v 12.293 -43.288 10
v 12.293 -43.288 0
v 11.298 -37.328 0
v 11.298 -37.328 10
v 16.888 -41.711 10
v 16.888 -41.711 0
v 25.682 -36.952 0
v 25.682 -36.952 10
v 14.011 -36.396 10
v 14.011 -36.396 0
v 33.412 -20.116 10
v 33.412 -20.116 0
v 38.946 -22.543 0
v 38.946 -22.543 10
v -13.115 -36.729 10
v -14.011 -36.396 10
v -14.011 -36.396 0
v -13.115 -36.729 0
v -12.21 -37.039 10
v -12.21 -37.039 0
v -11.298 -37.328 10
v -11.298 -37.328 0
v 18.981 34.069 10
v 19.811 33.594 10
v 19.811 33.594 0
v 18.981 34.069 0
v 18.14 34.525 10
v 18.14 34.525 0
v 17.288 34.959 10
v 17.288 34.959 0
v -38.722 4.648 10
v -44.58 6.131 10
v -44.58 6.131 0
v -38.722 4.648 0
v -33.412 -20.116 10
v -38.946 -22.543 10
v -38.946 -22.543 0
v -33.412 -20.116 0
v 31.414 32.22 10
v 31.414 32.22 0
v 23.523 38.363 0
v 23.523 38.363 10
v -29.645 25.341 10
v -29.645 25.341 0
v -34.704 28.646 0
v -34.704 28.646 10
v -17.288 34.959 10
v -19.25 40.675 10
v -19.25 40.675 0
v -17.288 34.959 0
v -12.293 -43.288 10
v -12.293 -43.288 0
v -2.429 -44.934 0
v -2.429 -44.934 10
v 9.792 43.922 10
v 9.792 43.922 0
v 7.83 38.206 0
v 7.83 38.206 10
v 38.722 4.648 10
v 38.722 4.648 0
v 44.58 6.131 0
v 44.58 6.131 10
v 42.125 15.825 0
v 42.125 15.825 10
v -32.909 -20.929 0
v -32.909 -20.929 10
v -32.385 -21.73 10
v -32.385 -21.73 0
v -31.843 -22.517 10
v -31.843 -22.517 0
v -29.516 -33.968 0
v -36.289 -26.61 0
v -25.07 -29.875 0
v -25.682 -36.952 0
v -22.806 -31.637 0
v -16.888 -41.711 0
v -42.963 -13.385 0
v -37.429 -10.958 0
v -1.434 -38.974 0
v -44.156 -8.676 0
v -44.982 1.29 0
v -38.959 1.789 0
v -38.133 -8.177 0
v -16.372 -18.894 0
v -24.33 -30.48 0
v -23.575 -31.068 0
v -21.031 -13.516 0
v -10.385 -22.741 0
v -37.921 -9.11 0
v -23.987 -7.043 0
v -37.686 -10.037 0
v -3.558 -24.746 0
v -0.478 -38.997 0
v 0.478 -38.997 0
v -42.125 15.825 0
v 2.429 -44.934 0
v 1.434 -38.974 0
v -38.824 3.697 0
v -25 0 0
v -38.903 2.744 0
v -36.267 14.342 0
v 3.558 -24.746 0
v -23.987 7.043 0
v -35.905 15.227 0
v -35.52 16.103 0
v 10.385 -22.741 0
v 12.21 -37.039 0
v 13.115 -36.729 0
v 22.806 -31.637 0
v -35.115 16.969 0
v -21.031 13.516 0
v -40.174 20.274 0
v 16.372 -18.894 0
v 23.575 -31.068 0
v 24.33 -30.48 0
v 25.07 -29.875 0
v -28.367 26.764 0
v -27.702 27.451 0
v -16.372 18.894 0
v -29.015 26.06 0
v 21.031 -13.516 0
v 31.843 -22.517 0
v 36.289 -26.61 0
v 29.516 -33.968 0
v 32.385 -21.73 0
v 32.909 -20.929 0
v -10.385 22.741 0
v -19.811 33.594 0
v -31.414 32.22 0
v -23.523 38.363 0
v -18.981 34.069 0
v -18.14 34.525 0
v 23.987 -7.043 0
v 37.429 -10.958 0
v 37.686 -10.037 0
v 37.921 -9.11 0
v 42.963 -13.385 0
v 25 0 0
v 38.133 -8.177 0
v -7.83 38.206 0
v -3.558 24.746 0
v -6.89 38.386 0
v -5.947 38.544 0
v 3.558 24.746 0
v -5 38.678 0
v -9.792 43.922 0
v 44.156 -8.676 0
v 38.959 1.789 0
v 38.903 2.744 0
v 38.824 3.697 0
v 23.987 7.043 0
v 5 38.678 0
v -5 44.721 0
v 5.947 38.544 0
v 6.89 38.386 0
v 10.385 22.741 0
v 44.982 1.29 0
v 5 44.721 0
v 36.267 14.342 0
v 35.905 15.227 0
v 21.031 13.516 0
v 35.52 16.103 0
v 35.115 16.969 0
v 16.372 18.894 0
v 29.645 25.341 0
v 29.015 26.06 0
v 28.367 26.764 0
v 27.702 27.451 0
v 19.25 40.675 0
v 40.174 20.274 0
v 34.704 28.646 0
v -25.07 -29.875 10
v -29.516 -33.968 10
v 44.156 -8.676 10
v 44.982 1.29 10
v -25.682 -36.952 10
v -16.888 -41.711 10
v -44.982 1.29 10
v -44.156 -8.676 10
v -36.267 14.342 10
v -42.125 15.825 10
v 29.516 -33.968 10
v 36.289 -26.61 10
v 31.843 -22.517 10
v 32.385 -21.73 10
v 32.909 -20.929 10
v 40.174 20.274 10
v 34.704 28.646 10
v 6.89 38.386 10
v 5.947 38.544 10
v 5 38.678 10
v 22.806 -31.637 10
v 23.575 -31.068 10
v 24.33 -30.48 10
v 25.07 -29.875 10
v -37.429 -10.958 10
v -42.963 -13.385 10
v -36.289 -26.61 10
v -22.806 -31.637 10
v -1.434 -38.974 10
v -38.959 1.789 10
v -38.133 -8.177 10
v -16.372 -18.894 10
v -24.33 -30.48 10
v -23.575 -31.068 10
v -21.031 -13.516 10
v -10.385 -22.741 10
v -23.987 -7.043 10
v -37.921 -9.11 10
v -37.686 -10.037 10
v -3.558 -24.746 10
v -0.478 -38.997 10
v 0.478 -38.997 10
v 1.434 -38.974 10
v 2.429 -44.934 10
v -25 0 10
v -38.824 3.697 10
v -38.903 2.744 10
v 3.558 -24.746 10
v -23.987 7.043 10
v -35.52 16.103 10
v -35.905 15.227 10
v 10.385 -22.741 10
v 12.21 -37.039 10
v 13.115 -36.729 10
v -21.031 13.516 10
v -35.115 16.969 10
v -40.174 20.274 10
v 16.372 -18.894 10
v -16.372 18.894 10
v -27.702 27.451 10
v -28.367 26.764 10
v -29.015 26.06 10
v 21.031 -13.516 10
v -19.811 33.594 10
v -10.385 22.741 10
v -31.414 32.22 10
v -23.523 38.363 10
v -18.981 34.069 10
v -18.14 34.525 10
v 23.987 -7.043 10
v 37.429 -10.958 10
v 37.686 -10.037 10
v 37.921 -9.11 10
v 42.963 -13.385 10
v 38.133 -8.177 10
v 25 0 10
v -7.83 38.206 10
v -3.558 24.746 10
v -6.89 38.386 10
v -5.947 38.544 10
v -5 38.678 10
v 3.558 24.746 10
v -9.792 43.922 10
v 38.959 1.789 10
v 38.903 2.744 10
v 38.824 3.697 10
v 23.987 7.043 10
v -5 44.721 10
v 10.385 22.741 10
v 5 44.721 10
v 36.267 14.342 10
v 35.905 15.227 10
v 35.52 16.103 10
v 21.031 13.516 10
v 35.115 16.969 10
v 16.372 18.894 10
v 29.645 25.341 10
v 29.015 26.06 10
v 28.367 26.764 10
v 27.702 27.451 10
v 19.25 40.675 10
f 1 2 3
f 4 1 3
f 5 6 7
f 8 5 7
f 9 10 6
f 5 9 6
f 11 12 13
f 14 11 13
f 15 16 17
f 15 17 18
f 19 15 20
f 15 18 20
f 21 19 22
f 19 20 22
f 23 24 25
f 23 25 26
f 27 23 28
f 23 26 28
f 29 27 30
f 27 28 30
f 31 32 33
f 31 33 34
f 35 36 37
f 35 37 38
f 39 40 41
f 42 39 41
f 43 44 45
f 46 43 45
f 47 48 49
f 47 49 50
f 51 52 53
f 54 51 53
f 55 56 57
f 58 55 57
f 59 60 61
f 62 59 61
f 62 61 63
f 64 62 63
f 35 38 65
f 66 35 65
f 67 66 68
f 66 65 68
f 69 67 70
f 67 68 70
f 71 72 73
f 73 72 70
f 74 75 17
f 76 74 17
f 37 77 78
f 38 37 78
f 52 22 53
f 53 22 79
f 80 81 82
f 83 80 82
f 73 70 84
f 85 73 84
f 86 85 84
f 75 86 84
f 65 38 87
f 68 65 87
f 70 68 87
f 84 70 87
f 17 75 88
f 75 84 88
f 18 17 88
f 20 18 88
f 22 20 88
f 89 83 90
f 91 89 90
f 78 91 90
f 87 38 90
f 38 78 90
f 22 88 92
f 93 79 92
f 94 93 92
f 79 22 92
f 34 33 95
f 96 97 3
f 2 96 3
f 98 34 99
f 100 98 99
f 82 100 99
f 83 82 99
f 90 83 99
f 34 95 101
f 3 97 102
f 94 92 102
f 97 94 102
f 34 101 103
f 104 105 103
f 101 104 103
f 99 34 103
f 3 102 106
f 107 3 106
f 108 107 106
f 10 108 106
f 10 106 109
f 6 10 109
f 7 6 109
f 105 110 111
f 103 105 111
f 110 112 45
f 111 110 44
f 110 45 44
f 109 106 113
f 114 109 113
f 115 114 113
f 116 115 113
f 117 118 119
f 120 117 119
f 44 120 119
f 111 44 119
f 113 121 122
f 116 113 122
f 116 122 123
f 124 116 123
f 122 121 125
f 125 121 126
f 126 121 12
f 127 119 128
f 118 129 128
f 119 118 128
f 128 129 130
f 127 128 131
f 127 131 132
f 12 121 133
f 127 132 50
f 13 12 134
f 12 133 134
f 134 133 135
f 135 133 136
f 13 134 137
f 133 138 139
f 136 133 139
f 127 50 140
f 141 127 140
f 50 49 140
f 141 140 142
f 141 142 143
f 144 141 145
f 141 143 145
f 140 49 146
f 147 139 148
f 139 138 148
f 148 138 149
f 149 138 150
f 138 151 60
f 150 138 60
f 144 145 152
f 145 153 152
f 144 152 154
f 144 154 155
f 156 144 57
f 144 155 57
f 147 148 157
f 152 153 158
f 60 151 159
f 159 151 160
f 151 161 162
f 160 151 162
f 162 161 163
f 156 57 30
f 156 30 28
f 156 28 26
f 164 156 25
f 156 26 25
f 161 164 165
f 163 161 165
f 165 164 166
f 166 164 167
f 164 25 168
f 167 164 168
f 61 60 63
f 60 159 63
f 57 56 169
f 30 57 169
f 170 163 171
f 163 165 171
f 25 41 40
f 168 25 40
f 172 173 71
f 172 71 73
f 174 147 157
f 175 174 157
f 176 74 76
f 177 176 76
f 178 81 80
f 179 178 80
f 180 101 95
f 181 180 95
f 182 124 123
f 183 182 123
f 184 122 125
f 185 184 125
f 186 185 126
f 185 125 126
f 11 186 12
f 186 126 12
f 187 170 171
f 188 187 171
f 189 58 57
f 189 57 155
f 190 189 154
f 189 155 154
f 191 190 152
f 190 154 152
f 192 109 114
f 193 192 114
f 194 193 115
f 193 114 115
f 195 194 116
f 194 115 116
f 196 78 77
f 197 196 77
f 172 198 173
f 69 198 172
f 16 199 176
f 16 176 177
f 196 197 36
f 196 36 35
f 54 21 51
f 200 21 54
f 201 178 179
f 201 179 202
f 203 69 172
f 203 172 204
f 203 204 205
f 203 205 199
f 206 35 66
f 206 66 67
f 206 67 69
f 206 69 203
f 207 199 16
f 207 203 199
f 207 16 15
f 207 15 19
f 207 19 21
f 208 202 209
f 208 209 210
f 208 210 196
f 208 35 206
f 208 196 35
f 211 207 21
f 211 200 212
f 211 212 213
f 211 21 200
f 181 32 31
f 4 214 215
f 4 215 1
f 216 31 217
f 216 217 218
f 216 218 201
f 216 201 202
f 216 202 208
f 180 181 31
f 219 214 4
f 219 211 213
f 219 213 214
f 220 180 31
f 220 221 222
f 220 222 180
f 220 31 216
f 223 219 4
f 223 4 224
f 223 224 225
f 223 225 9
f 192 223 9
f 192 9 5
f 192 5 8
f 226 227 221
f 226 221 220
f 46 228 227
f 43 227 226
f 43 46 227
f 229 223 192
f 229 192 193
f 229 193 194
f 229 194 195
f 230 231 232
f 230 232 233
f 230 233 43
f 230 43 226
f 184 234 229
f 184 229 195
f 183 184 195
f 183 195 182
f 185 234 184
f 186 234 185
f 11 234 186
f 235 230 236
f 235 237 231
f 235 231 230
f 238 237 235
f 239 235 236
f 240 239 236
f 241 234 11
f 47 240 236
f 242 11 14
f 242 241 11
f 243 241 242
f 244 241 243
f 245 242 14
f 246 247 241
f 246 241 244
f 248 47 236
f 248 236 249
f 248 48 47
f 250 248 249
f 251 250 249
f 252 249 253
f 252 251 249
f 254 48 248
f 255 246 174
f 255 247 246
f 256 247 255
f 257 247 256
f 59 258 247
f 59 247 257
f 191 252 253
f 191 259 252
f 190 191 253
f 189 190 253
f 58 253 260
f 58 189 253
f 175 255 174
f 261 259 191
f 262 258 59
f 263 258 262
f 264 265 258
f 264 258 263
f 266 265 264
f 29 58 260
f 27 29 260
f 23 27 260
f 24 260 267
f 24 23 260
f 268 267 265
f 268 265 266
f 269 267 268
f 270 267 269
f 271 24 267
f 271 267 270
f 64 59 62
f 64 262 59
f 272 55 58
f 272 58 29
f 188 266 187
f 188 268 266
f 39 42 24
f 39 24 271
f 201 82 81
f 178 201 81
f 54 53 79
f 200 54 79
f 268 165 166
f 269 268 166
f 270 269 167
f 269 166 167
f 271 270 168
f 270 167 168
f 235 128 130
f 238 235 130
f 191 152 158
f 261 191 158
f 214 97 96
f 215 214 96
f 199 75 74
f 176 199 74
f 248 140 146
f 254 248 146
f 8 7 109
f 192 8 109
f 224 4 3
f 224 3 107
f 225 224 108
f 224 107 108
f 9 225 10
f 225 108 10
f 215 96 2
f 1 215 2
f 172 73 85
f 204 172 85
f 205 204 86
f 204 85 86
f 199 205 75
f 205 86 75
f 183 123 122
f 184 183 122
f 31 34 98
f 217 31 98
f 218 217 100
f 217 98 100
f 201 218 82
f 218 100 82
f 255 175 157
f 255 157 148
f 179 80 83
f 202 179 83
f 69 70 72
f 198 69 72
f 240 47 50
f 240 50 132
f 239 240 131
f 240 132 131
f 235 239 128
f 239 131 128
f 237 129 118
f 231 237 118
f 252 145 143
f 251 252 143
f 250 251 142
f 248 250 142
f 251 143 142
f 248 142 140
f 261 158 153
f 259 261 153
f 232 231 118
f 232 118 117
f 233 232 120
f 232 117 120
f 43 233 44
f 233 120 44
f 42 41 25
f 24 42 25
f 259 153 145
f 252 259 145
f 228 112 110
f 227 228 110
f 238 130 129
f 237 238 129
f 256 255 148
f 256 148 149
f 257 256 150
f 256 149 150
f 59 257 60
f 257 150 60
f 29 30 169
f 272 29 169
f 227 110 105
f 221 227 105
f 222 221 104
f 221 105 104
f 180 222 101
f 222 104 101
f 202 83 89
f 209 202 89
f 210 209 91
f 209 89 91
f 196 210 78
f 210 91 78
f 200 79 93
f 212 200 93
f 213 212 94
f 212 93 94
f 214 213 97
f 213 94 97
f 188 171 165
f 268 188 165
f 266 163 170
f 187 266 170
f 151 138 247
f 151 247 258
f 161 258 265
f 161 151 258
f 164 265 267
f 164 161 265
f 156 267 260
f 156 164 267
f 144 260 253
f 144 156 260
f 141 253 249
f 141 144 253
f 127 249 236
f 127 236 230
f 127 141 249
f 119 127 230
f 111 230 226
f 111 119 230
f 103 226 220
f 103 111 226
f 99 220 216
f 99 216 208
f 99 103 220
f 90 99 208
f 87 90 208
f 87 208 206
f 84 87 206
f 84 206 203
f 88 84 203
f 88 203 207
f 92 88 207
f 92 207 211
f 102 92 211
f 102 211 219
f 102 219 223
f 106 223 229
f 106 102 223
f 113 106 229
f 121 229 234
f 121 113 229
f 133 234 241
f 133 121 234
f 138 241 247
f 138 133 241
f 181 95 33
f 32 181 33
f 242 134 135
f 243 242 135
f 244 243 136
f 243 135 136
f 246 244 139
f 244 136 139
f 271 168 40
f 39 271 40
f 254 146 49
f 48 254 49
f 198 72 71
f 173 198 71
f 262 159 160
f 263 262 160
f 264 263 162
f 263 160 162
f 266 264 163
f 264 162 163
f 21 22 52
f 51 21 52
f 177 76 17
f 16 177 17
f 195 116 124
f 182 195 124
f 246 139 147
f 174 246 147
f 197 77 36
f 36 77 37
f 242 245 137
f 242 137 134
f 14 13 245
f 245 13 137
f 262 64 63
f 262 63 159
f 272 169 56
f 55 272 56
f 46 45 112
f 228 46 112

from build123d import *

# Parameters (mm, degrees)
SKETCH1_R           = 39
SKETCH1_R_2         = 25
BOSS_EXTRUDE1_DEPTH = 10


with BuildPart() as part:
    # Sketch1 → Boss-Extrude1 (new body)
    # profile 1 of 20: a face of its own
    with BuildSketch(Plane.XY):
        Circle(SKETCH1_R)
        Circle(SKETCH1_R_2, mode=Mode.SUBTRACT)
    # profile 2 of 20: a face of its own
    with BuildSketch(Plane.XY):
        with BuildLine():
            ThreePointArc((-38.722045261, 4.647925426), (-37.806610372, 9.573933998), (-36.26719039, 14.341928085))
            Line((-36.26719039, 14.341928085), (-42.125470405, 15.825446064))
            Line((-42.125470405, 15.825446064), (-44.580325277, 6.131443405))
            Line((-44.580325277, 6.131443405), (-38.722045261, 4.647925426))
        make_face()
    # profile 3 of 20: a face of its own
    with BuildSketch(Plane.XY):
        with BuildLine():
            ThreePointArc((-35.114799123, 16.969115549), (-32.649492652, 21.330978167), (-29.645317542, 25.340780332))
            Line((-29.645317542, 25.340780332), (-34.704482287, 28.646097626))
            Line((-34.704482287, 28.646097626), (-40.173963868, 20.274432843))
            Line((-40.173963868, 20.274432843), (-35.114799123, 16.969115549))
        make_face()
    # profile 4 of 20: a face of its own
    with BuildSketch(Plane.XY):
        with BuildLine():
            ThreePointArc((-27.702319638, 27.451438699), (-23.954295795, 30.776479866), (-19.810914544, 33.593565826))
            Line((-19.810914544, 33.593565826), (-23.522725017, 38.36250002))
            Line((-23.522725017, 38.36250002), (-31.414130111, 32.220372893))
            Line((-31.414130111, 32.220372893), (-27.702319638, 27.451438699))
        make_face()
    # profile 5 of 20: a face of its own
    with BuildSketch(Plane.XY):
        with BuildLine():
            ThreePointArc((-17.287863974, 34.958972514), (-12.663279299, 36.886872426), (-7.829691557, 38.205967206))
            Line((-7.829691557, 38.205967206), (-9.791915499, 43.921730281))
            Line((-9.791915499, 43.921730281), (-19.250087916, 40.674735589))
            Line((-19.250087916, 40.674735589), (-17.287863974, 34.958972514))
        make_face()
    # profile 6 of 20: a face of its own
    with BuildSketch(Plane.XY):
        with BuildLine():
            Line((9.791915499, 43.921730281), (7.829691557, 38.205967206))
            ThreePointArc((7.829691557, 38.205967206), (12.663279299, 36.886872426), (17.287863974, 34.958972514))
            Line((17.287863974, 34.958972514), (19.250087916, 40.674735589))
            Line((19.250087916, 40.674735589), (9.791915499, 43.921730281))
        make_face()
    # profile 7 of 20: a face of its own
    with BuildSketch(Plane.XY):
        with BuildLine():
            Line((5, 44.72135955), (-5, 44.72135955))
            Line((-5, 44.72135955), (-5, 38.678159212))
            ThreePointArc((-5, 38.678159212), (0, 39), (5, 38.678159212))
            Line((5, 38.678159212), (5, 44.72135955))
        make_face()
    # profile 8 of 20: a face of its own
    with BuildSketch(Plane.XY):
        with BuildLine():
            Line((23.522725017, 38.36250002), (19.810914544, 33.593565826))
            ThreePointArc((19.810914544, 33.593565826), (23.954295795, 30.776479866), (27.702319638, 27.451438699))
            Line((27.702319638, 27.451438699), (31.414130111, 32.220372893))
            Line((31.414130111, 32.220372893), (23.522725017, 38.36250002))
        make_face()
    # profile 9 of 20: a face of its own
    with BuildSketch(Plane.XY):
        with BuildLine():
            Line((34.704482287, 28.646097626), (29.645317542, 25.340780332))
            ThreePointArc((29.645317542, 25.340780332), (32.649492652, 21.330978167), (35.114799123, 16.969115549))
            Line((35.114799123, 16.969115549), (40.173963868, 20.274432843))
            Line((40.173963868, 20.274432843), (34.704482287, 28.646097626))
        make_face()
    # profile 10 of 20: a face of its own
    with BuildSketch(Plane.XY):
        with BuildLine():
            Line((42.125470405, 15.825446064), (36.26719039, 14.341928085))
            ThreePointArc((36.26719039, 14.341928085), (37.806610372, 9.573933998), (38.722045261, 4.647925426))
            Line((38.722045261, 4.647925426), (44.580325277, 6.131443405))
            Line((44.580325277, 6.131443405), (42.125470405, 15.825446064))
        make_face()
    # profile 11 of 20: a face of its own
    with BuildSketch(Plane.XY):
        with BuildLine():
            Line((44.981510161, 1.289861865), (38.958950416, 1.788905393))
            ThreePointArc((38.958950416, 1.788905393), (38.989736253, 0.894688154), (39, 0))
            ThreePointArc((39, 0), (38.782683774, -4.111379241), (38.133156961, -8.176939537))
            Line((38.133156961, -8.176939537), (44.155716706, -8.675983065))
            Line((44.155716706, -8.675983065), (44.981510161, 1.289861865))
        make_face()
    # profile 12 of 20: a face of its own
    with BuildSketch(Plane.XY):
        with BuildLine():
            Line((42.963105331, -13.385498882), (37.428903653, -10.957972956))
            ThreePointArc((37.428903653, -10.957972956), (35.71515974, -15.666121561), (33.411949407, -20.115706223))
            Line((33.411949407, -20.115706223), (38.946151084, -22.543232149))
            Line((38.946151084, -22.543232149), (42.963105331, -13.385498882))
        make_face()
    # profile 13 of 20: a face of its own
    with BuildSketch(Plane.XY):
        with BuildLine():
            Line((36.288981397, -26.610333128), (31.842854411, -22.517384905))
            ThreePointArc((31.842854411, -22.517384905), (28.693232516, -26.413981293), (25.070038695, -29.874624012))
            Line((25.070038695, -29.874624012), (29.516165681, -33.967572235))
            Line((29.516165681, -33.967572235), (36.288981397, -26.610333128))
        make_face()
    # profile 14 of 20: a face of its own
    with BuildSketch(Plane.XY):
        with BuildLine():
            ThreePointArc((-38.133156961, -8.176939537), (-38.866795227, -3.220594473), (-38.958950416, 1.788905393))
            Line((-38.958950416, 1.788905393), (-44.981510161, 1.289861865))
            Line((-44.981510161, 1.289861865), (-44.155716706, -8.675983065))
            Line((-44.155716706, -8.675983065), (-38.133156961, -8.176939537))
        make_face()
    # profile 15 of 20: a face of its own
    with BuildSketch(Plane.XY):
        with BuildLine():
            ThreePointArc((-33.411949407, -20.115706223), (-35.71515974, -15.666121561), (-37.428903653, -10.957972956))
            Line((-37.428903653, -10.957972956), (-42.963105331, -13.385498882))
            Line((-42.963105331, -13.385498882), (-38.946151084, -22.543232149))
            Line((-38.946151084, -22.543232149), (-33.411949407, -20.115706223))
        make_face()
    # profile 16 of 20: a face of its own
    with BuildSketch(Plane.XY):
        with BuildLine():
            ThreePointArc((-25.070038695, -29.874624012), (-28.693232516, -26.413981293), (-31.842854411, -22.517384905))
            Line((-31.842854411, -22.517384905), (-36.288981397, -26.610333128))
            Line((-36.288981397, -26.610333128), (-29.516165681, -33.967572235))
            Line((-29.516165681, -33.967572235), (-25.070038695, -29.874624012))
        make_face()
    # profile 17 of 20: a face of its own
    with BuildSketch(Plane.XY):
        with BuildLine():
            ThreePointArc((-14.011400288, -36.396162737), (-18.561948328, -34.299476297), (-22.8061378, -31.636688806))
            Line((-22.8061378, -31.636688806), (-25.682383247, -36.951524877))
            Line((-25.682383247, -36.951524877), (-16.887645735, -41.710998808))
            Line((-16.887645735, -41.710998808), (-14.011400288, -36.396162737))
        make_face()
    # profile 18 of 20: a face of its own
    with BuildSketch(Plane.XY):
        with BuildLine():
            ThreePointArc((-1.434409251, -38.973612485), (-6.419189021, -38.468090833), (-11.298022285, -37.327666582))
            Line((-11.298022285, -37.327666582), (-12.292700369, -43.288445544))
            Line((-12.292700369, -43.288445544), (-2.429087335, -44.934391447))
            Line((-2.429087335, -44.934391447), (-1.434409251, -38.973612485))
        make_face()
    # profile 19 of 20: a face of its own
    with BuildSketch(Plane.XY):
        with BuildLine():
            Line((12.292700369, -43.288445544), (11.298022285, -37.327666582))
            ThreePointArc((11.298022285, -37.327666582), (6.419189021, -38.468090833), (1.434409251, -38.973612485))
            Line((1.434409251, -38.973612485), (2.429087335, -44.934391447))
            Line((2.429087335, -44.934391447), (12.292700369, -43.288445544))
        make_face()
    # profile 20 of 20: a face of its own
    with BuildSketch(Plane.XY):
        with BuildLine():
            Line((25.682383247, -36.951524877), (22.8061378, -31.636688806))
            ThreePointArc((22.8061378, -31.636688806), (18.561948328, -34.299476297), (14.011400288, -36.396162737))
            Line((14.011400288, -36.396162737), (16.887645735, -41.710998808))
            Line((16.887645735, -41.710998808), (25.682383247, -36.951524877))
        make_face()
    extrude(amount=BOSS_EXTRUDE1_DEPTH)


solid = part.part
